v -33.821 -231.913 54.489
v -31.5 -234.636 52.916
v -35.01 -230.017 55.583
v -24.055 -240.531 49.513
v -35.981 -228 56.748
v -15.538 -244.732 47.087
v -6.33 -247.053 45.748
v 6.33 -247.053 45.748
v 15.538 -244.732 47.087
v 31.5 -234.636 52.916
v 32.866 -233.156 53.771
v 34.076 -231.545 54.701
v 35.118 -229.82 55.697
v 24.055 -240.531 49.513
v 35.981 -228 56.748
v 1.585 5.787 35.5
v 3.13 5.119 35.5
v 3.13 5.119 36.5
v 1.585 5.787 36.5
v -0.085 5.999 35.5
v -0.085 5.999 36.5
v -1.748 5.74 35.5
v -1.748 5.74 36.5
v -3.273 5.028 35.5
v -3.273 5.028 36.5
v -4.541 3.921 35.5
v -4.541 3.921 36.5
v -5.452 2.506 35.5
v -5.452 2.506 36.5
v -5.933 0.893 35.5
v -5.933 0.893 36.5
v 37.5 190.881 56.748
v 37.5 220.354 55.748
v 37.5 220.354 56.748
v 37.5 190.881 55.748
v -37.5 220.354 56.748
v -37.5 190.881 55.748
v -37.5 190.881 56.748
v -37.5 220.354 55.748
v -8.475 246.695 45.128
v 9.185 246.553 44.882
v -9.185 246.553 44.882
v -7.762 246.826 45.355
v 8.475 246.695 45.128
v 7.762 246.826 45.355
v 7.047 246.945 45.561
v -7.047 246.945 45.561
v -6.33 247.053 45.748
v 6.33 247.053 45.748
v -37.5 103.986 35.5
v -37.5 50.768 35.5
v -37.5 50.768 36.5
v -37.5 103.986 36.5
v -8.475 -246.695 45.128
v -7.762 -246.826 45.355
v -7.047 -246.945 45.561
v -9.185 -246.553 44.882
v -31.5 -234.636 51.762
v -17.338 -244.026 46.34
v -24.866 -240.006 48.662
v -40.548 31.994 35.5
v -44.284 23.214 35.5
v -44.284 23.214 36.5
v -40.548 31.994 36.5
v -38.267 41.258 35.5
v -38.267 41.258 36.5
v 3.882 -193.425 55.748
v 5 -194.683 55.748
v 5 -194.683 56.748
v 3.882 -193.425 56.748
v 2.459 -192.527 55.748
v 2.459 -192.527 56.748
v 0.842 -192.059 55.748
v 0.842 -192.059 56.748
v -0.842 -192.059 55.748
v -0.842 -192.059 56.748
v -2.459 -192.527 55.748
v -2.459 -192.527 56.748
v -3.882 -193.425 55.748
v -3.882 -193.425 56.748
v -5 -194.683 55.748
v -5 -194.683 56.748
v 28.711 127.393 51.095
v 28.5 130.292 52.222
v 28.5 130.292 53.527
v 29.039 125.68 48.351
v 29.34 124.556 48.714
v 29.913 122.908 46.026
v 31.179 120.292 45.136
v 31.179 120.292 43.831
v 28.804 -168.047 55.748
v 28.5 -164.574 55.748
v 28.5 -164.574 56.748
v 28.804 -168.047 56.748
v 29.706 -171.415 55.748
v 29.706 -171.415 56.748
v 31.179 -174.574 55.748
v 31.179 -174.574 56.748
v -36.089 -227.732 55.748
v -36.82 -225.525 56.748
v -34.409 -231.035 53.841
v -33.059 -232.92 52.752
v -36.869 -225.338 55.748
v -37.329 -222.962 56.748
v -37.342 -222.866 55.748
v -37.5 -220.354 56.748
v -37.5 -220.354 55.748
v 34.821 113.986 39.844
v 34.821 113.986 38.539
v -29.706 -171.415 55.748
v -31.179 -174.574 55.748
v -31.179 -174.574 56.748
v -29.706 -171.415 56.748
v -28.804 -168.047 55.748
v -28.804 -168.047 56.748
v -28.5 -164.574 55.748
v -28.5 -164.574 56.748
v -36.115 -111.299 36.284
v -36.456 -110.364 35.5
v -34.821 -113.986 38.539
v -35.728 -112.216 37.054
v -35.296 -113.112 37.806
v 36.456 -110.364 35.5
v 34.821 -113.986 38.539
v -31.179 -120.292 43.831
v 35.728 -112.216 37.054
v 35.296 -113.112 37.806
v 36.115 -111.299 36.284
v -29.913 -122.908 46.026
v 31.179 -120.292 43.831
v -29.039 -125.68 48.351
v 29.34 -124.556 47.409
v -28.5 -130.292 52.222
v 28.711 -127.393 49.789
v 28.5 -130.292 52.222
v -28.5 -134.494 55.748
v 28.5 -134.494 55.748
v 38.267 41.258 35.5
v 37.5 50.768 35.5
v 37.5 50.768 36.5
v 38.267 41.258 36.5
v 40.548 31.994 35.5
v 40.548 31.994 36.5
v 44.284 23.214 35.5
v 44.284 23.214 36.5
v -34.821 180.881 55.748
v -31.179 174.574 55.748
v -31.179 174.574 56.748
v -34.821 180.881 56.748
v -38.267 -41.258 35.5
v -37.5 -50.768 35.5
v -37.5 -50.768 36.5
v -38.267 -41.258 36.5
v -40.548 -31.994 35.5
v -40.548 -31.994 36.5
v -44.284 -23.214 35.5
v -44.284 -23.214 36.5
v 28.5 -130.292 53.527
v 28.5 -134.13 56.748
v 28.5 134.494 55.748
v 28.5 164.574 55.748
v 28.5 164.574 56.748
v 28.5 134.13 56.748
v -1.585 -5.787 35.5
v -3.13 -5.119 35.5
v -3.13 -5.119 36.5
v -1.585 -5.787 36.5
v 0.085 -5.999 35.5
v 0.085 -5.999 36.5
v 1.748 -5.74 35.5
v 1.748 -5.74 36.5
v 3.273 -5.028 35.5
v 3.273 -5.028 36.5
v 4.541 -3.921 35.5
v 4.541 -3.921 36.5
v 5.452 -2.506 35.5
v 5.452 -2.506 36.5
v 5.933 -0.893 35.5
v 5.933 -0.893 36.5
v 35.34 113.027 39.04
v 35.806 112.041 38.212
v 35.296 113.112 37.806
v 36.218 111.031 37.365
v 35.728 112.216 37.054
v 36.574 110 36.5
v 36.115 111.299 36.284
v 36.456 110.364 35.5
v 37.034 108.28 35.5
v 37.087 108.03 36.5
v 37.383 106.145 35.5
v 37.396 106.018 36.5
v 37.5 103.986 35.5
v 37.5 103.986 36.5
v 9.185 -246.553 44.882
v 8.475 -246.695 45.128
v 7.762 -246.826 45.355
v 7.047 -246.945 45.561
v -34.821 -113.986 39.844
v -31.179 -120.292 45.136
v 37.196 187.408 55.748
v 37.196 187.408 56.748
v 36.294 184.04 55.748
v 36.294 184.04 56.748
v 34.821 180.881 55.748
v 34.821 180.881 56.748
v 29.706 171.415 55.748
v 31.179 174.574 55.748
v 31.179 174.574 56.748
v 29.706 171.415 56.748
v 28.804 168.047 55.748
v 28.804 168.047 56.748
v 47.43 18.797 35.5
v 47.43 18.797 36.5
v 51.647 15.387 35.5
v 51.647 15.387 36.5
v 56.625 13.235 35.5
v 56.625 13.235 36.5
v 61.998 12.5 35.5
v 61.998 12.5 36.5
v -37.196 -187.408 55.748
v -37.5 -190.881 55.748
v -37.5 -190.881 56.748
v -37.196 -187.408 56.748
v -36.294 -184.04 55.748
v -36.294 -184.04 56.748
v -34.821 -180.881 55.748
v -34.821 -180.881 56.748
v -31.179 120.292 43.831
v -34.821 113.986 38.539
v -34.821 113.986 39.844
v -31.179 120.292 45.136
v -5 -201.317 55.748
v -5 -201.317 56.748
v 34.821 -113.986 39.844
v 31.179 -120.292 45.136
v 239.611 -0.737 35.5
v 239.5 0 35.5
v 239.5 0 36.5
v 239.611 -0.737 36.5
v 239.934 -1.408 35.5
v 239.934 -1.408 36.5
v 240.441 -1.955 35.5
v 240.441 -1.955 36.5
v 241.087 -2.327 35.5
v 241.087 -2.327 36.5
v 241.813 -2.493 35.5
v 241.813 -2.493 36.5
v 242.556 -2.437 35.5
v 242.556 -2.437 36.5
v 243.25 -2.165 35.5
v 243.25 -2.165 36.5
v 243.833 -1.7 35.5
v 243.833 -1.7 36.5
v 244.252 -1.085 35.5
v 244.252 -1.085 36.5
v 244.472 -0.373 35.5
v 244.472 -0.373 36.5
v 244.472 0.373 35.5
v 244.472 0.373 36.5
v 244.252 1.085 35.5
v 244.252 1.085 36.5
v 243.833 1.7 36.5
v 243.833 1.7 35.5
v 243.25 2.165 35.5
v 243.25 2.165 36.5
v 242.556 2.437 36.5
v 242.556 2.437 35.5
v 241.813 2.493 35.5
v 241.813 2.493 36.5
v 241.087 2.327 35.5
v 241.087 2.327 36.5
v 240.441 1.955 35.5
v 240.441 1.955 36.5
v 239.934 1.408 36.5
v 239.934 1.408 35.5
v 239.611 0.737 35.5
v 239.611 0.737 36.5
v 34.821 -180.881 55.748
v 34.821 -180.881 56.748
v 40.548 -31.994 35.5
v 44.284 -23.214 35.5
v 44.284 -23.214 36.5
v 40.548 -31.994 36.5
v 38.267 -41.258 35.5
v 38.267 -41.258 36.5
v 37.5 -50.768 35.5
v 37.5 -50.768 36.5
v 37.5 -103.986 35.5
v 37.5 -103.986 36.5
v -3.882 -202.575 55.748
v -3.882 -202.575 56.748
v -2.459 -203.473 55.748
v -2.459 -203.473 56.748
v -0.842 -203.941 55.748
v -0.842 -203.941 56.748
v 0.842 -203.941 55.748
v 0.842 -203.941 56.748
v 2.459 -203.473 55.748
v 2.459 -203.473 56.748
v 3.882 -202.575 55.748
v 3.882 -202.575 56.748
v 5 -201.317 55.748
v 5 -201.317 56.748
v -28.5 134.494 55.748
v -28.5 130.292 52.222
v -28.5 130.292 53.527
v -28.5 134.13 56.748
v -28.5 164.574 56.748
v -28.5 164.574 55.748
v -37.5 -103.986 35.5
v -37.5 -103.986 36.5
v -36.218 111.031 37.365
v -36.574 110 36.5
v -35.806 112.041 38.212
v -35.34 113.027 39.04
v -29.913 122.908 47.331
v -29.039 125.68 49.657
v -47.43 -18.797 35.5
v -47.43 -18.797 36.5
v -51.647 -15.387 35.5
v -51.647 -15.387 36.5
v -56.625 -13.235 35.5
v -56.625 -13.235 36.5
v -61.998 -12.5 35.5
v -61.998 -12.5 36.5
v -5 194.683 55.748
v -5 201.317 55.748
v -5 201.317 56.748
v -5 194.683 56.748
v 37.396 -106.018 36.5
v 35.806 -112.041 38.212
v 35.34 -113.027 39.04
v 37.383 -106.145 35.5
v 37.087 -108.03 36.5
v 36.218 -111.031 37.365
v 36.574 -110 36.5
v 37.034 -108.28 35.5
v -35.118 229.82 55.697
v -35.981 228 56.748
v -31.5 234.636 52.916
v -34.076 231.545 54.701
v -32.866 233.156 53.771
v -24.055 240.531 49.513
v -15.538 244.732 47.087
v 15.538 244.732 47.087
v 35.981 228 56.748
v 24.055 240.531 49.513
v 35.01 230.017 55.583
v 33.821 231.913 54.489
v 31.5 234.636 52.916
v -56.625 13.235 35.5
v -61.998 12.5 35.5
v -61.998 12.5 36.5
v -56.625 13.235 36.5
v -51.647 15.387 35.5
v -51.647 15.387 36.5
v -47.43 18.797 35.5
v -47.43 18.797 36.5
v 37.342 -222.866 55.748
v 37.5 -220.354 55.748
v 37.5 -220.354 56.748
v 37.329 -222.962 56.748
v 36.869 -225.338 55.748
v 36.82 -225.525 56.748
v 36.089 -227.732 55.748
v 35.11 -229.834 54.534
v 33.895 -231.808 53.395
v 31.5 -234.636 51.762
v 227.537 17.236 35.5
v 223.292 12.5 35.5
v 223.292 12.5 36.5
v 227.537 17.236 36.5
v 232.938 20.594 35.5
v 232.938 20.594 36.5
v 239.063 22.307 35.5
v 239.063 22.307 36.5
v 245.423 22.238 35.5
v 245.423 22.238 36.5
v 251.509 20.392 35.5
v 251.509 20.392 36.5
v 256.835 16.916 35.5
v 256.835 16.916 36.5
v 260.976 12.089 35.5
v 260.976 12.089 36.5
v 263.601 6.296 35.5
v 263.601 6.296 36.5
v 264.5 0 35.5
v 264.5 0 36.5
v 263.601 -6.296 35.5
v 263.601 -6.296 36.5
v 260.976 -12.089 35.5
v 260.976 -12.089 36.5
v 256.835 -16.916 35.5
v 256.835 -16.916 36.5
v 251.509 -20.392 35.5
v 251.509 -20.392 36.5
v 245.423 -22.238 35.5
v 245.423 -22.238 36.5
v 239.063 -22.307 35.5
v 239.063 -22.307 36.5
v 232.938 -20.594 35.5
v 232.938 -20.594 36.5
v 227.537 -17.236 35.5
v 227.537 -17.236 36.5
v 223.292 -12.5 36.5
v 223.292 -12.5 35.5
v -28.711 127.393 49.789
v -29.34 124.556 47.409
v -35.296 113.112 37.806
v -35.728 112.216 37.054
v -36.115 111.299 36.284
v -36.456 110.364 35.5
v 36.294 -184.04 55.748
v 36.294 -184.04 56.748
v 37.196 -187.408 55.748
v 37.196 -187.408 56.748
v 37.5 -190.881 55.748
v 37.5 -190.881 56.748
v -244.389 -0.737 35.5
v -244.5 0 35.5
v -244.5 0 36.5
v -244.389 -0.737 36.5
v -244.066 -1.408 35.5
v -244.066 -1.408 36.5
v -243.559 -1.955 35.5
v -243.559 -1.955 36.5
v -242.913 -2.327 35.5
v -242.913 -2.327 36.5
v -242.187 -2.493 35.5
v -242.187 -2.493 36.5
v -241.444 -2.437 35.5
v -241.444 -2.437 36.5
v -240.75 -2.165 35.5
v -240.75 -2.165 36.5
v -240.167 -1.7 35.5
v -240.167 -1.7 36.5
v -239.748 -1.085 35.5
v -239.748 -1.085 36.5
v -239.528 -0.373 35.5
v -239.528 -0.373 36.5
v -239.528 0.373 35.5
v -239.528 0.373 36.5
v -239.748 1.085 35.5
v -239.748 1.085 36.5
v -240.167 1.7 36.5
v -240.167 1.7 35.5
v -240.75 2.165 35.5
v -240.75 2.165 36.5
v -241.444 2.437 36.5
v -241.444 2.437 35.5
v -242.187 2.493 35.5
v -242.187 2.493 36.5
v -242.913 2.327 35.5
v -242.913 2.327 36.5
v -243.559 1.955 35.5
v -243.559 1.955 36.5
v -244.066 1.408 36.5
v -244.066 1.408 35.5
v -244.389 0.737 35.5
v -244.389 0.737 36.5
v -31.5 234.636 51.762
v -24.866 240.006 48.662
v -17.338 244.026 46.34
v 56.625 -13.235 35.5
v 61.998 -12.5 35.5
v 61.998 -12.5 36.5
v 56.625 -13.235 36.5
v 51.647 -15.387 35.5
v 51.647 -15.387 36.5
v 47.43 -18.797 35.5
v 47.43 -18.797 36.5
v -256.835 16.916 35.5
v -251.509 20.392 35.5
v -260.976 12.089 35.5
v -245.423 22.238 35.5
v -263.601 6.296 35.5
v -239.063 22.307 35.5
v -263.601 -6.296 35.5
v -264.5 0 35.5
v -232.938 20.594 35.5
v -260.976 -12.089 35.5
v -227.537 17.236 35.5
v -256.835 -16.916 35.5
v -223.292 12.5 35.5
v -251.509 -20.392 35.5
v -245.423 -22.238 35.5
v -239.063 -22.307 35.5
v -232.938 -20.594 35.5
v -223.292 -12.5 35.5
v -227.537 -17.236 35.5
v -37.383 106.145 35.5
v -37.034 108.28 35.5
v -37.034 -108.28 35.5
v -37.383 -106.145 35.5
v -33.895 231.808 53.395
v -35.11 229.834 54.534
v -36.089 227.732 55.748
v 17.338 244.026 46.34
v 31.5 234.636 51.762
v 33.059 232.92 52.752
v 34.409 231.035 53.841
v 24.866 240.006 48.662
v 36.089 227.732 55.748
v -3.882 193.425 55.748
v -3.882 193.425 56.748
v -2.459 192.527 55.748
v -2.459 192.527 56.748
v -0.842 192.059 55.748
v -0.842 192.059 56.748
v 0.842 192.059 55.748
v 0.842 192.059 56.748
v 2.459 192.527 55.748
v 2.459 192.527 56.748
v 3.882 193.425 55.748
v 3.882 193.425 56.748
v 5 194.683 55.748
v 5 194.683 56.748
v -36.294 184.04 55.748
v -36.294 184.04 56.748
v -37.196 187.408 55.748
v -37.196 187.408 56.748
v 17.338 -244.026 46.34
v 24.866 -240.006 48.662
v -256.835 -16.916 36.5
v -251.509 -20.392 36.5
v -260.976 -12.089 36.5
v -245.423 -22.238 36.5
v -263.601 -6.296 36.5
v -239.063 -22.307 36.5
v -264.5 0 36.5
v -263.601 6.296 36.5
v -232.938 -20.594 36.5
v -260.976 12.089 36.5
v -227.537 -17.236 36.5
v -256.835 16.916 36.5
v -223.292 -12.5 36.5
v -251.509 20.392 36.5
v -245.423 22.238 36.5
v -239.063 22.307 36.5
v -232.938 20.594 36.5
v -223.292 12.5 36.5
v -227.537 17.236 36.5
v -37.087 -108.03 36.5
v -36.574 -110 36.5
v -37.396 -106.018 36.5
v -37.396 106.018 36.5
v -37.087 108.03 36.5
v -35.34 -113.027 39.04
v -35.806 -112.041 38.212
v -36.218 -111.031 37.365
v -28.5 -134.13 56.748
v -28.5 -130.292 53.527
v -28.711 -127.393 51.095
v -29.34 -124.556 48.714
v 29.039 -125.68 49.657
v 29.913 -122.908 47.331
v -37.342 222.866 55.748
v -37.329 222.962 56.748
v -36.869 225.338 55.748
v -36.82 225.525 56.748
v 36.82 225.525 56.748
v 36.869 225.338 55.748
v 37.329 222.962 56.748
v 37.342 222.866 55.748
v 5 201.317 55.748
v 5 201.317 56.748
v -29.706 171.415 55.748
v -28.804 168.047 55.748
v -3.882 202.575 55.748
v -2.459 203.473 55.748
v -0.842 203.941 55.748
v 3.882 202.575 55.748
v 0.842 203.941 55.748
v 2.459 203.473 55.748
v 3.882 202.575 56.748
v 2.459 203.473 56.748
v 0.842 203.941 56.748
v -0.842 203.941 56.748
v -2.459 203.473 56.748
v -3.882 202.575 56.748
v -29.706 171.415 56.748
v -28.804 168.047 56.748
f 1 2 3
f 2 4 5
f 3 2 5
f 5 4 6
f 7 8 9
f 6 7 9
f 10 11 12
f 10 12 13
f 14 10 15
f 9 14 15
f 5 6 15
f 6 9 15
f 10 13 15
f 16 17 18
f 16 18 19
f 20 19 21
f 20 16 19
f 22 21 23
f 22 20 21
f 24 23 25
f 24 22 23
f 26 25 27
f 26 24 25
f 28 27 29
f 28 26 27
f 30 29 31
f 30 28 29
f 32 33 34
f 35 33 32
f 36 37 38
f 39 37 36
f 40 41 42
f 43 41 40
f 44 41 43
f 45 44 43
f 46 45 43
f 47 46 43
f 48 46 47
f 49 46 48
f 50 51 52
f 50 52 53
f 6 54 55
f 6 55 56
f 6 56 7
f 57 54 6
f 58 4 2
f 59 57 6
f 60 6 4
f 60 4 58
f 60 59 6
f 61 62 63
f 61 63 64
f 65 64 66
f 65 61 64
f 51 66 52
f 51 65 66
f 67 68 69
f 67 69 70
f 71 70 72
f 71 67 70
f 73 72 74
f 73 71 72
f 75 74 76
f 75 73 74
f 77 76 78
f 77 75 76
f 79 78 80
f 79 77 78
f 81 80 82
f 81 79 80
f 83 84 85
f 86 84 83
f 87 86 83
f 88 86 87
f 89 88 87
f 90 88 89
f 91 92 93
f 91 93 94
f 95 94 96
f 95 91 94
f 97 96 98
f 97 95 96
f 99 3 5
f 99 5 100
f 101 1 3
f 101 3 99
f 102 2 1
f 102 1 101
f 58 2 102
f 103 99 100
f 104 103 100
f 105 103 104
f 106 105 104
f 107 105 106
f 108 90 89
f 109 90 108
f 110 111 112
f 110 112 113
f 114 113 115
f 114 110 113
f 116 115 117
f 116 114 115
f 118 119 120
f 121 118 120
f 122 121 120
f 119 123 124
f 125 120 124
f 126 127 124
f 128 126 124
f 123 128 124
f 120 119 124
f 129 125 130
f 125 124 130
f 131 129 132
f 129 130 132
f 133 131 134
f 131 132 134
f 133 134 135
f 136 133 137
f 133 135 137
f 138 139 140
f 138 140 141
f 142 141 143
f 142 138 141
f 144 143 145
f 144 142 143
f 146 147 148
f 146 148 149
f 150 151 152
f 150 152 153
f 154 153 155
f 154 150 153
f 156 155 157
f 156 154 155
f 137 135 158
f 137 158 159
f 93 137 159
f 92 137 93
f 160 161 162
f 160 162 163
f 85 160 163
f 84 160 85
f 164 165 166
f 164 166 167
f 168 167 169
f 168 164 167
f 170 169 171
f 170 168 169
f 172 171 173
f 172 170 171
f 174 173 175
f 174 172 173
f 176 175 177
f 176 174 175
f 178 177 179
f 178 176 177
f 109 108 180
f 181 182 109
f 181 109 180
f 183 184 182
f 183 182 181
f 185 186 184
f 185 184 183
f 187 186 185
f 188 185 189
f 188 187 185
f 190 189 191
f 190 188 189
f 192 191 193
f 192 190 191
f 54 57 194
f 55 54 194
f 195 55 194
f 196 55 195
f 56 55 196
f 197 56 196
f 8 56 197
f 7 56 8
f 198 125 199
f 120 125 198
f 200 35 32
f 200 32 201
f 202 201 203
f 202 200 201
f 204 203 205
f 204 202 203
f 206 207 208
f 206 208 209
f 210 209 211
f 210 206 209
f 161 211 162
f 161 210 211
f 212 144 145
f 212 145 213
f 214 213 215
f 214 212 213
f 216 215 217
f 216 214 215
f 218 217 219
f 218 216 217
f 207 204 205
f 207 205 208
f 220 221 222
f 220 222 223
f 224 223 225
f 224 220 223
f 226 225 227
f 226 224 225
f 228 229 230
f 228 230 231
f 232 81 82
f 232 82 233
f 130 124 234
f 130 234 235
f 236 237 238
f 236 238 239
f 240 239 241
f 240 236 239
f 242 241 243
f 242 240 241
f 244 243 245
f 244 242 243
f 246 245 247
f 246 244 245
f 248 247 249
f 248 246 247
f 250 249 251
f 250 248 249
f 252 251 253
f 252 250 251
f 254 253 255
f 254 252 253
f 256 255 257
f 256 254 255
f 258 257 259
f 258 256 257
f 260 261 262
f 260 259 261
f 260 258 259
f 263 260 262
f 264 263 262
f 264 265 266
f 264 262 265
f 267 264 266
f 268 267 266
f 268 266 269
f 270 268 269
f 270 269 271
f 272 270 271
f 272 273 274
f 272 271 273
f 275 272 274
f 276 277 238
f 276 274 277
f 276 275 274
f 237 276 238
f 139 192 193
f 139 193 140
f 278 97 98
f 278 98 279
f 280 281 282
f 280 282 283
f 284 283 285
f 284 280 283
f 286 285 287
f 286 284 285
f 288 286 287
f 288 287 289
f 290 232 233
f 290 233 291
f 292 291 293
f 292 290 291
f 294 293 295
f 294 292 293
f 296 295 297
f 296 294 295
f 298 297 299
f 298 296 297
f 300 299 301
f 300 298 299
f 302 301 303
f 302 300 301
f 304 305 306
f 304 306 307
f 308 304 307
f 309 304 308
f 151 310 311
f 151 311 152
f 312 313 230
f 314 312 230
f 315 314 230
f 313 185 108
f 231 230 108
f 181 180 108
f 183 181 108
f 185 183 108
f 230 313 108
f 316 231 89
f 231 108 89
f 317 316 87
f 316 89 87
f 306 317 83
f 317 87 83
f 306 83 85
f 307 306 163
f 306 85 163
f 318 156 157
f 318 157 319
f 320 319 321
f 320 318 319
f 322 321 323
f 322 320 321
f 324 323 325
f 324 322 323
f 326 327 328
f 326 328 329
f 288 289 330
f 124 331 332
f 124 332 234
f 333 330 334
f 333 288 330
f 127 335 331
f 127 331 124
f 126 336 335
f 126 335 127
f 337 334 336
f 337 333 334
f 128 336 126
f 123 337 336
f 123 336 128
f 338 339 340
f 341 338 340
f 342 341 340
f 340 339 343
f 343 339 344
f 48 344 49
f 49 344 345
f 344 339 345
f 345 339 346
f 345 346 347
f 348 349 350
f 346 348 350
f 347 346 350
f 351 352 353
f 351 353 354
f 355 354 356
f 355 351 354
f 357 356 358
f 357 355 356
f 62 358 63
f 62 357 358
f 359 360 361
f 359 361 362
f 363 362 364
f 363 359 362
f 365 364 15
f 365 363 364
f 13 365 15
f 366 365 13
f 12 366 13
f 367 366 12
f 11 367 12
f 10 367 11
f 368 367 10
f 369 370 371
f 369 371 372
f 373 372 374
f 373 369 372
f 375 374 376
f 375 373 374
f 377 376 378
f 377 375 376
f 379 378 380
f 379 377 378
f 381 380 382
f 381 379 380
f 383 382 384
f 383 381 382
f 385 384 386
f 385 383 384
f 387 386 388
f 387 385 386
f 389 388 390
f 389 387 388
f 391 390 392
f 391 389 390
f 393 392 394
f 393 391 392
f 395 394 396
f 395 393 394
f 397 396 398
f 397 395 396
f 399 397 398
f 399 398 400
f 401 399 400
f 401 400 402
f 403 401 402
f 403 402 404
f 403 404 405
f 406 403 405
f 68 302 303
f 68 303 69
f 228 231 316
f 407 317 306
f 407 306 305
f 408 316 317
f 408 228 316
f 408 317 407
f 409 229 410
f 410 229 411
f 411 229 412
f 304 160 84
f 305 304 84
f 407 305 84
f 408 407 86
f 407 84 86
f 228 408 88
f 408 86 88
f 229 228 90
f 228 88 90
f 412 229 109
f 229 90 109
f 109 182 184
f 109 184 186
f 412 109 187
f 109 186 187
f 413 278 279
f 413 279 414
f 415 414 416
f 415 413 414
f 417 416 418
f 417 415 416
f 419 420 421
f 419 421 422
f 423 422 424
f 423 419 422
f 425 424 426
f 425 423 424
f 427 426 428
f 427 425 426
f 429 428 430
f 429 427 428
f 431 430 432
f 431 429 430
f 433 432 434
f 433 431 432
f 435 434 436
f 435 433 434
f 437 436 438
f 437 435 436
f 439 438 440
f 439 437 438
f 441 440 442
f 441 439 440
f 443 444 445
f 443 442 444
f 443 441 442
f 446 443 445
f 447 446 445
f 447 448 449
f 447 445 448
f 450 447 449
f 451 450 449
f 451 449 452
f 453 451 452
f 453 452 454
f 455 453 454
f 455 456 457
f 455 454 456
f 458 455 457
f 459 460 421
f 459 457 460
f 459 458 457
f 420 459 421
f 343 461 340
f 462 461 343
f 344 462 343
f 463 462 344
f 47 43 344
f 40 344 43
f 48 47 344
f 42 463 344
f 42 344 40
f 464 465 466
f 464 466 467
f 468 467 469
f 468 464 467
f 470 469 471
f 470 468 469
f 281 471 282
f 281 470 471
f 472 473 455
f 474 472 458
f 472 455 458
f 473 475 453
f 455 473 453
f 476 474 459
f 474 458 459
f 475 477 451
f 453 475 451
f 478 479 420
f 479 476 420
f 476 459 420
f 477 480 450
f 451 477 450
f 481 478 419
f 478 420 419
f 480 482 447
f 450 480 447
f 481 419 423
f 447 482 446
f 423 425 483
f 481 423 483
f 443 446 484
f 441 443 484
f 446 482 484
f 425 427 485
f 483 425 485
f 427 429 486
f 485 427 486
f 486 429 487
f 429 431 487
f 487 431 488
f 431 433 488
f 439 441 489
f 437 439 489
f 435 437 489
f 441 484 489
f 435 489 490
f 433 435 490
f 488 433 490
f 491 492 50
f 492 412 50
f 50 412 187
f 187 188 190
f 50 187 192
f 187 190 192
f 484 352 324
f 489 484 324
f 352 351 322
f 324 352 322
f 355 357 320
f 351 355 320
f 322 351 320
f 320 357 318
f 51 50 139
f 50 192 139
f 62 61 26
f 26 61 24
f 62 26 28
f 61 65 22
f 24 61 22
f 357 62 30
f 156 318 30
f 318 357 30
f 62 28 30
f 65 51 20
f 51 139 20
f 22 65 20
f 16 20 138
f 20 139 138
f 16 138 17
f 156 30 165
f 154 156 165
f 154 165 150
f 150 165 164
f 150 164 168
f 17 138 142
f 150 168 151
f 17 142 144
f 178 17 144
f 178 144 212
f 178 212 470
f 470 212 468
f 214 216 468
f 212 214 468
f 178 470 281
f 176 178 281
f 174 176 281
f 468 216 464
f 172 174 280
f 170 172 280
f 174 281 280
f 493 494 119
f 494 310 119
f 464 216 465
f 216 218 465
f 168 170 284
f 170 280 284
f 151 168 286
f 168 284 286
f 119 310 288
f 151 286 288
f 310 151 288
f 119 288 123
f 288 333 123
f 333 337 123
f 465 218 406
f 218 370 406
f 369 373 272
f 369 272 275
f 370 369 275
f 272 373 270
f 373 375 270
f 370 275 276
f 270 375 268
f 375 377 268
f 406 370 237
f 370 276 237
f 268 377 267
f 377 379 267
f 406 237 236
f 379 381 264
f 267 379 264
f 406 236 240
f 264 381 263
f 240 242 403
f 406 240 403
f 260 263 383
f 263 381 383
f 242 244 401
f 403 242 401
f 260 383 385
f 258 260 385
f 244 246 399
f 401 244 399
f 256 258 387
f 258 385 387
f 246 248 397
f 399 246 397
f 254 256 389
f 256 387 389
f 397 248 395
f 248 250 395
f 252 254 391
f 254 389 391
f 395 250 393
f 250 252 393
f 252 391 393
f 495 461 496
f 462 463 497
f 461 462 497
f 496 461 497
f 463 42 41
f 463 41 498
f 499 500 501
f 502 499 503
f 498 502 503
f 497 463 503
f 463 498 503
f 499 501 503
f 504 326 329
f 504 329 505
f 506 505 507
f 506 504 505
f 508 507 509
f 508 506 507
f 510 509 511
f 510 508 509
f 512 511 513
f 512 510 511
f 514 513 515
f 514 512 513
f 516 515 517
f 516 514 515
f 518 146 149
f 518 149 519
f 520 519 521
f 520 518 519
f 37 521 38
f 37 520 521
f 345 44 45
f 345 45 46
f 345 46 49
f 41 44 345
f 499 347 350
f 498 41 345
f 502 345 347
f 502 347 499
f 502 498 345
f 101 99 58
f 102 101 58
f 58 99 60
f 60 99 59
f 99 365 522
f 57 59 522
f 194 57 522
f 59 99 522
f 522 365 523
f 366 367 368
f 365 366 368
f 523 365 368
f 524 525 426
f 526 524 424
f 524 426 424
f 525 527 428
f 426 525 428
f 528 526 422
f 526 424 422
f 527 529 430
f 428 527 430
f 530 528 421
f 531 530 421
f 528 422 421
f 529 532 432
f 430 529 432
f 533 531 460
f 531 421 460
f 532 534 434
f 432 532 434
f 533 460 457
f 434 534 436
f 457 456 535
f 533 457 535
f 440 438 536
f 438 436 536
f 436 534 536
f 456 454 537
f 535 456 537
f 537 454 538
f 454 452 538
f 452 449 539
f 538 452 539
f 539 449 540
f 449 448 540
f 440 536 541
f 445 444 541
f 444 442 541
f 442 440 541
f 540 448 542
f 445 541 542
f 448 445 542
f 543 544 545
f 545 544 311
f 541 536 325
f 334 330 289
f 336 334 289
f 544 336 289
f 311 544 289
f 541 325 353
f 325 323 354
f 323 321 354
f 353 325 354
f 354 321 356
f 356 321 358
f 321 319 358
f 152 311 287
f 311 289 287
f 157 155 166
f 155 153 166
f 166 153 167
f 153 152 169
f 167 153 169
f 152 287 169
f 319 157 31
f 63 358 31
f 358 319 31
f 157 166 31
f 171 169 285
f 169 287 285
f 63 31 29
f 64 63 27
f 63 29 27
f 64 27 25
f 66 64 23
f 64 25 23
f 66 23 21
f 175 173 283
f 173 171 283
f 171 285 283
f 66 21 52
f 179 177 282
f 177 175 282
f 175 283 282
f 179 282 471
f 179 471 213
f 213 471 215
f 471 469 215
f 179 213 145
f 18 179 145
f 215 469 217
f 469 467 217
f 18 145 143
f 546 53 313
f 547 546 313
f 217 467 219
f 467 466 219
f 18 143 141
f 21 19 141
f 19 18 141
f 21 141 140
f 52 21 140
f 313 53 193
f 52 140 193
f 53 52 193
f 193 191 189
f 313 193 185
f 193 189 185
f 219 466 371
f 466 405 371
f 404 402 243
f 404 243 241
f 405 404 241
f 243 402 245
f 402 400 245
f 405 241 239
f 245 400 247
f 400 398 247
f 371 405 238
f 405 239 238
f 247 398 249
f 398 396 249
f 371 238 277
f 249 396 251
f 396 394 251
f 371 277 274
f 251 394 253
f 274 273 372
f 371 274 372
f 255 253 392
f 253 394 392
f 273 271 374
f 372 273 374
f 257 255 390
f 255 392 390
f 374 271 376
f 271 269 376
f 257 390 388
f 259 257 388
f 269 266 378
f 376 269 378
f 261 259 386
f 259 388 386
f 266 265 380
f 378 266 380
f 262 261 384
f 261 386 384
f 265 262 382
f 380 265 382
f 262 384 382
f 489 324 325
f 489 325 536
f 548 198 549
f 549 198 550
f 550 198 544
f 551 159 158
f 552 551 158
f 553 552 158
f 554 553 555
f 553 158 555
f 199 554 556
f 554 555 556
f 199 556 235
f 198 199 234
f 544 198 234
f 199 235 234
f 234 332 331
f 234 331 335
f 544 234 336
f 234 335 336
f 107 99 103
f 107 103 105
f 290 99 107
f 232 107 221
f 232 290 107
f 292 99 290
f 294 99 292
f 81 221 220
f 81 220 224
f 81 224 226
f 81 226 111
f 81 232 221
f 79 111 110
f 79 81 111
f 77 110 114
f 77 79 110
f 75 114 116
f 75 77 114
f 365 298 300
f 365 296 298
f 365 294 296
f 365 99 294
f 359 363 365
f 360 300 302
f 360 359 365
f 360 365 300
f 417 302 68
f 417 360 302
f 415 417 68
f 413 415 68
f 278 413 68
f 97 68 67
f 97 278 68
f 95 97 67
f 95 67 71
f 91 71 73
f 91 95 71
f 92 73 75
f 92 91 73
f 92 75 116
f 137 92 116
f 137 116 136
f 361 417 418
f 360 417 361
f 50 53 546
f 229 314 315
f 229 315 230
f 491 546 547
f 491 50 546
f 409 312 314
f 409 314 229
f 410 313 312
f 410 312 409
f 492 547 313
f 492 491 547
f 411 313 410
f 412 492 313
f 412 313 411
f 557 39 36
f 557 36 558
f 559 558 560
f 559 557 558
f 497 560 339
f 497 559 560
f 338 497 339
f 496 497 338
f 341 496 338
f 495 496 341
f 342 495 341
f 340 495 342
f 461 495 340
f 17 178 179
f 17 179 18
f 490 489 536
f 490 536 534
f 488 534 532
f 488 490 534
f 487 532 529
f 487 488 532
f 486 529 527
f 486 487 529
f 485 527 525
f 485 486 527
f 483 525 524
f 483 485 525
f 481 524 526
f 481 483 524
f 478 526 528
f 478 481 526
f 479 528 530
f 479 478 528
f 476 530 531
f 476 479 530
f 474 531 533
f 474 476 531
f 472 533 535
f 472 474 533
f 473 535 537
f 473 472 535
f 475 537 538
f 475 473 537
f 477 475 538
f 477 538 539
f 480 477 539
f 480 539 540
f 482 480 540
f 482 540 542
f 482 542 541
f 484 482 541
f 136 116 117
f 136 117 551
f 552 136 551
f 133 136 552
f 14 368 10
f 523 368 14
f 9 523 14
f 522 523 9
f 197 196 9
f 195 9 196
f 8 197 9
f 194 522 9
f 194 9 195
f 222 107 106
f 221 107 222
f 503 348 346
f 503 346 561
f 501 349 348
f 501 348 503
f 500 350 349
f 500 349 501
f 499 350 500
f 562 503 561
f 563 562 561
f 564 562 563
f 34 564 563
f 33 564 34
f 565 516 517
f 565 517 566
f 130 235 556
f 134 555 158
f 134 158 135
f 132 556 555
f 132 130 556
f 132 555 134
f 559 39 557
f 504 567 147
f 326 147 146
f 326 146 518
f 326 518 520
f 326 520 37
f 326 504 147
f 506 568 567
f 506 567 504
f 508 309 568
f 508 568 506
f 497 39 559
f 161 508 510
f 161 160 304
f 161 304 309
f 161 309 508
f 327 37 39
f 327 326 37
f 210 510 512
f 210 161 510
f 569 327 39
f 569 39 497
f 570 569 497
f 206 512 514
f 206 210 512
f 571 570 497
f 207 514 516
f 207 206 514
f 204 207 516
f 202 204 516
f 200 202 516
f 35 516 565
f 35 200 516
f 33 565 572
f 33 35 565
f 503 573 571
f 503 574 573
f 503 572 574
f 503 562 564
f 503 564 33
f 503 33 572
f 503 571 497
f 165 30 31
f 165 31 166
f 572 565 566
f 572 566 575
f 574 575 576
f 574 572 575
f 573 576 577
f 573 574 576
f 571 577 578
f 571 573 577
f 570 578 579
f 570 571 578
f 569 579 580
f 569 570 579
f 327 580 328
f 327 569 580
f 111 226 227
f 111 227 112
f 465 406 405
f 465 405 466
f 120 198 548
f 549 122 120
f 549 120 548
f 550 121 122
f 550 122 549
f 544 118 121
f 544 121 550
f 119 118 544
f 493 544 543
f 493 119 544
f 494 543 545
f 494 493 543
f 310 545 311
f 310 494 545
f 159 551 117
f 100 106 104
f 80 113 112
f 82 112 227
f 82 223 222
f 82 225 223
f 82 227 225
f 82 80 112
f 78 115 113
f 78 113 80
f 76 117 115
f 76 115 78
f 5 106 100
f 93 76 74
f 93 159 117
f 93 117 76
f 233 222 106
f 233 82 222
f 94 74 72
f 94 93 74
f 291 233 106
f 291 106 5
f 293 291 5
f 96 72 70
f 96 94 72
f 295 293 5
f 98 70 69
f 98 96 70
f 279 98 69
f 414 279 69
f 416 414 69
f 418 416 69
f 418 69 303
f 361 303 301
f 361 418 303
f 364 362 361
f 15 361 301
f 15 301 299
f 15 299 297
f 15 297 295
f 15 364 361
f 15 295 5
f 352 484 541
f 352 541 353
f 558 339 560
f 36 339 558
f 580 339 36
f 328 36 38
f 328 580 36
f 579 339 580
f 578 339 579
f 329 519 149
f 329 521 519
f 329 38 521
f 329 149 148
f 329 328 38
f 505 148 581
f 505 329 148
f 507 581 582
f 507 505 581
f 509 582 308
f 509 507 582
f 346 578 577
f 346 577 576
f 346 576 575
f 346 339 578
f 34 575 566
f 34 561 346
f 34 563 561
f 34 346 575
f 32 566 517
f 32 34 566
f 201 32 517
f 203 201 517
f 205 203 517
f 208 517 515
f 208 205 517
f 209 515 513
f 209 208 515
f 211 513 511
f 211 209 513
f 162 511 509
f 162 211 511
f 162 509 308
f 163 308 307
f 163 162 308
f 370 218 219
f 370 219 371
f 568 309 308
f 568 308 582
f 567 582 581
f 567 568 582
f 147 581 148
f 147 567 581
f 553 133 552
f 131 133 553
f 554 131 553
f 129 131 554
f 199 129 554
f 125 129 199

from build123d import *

# Parameters (mm, degrees)
SALIENTE_EXTRUIR1_DEPTH     = 271
CORTAR_EXTRUIR9_DEPTH       = 372.074494889
CORTAR_EXTRUIR9_DEPTH_BACK  = 372.074494889
CROQUIS4_R                  = 2.5
CORTAR_EXTRUIR11_DEPTH      = 372.074494889
CORTAR_EXTRUIR11_DEPTH_BACK = 372.074494889
CROQUIS2_W                  = 600.899293422
CROQUIS2_H                  = 554.061756016


with BuildPart() as part:
    # Croquis1 → Saliente-Extruir1 (new, symmetric)
    with BuildSketch(Plane(origin=(0, 0, 0), x_dir=(0, 0, -1), z_dir=(1, 0, 0))):
        Polygon((-36.5, -110), (-36.5, 110), (-56.747809705, 134.130399958), (-56.747809705, 198), (-56.747809705, 228), (-45.747809705, 247.052558883), (-44.881784301, 246.552558883), (-55.747809705, 227.732050808), (-55.747809705, 198), (-55.747809705, 134.494370193), (-35.5, 110.363970234), (-35.5, -110.363970234), (-55.747809705, -134.494370193), (-55.747809705, -198), (-55.747809705, -227.732050808), (-44.881784301, -246.552558883), (-45.747809705, -247.052558883), (-56.747809705, -228), (-56.747809705, -198), (-56.747809705, -134.130399958), align=None)
    extrude(amount=SALIENTE_EXTRUIR1_DEPTH, both=True)

    # Croquis4 → Cortar-Extruir9 (cut, two sides: drawn at the far end of the back side and taken through both)
    with BuildSketch(Plane.XY.offset(-CORTAR_EXTRUIR9_DEPTH_BACK)):
        with Locations(Location((-242, 0, 0), (0, 0, 180))):
            Circle(CROQUIS4_R)
        with Locations(Location((242, 0, 0), (0, 0, 180))):
            Circle(CROQUIS4_R)
        with BuildLine():
            Line((-5, 201.31662479), (-5, 194.68337521))
            ThreePointArc((-5, 194.68337521), (0, 192), (5, 194.68337521))
            Line((5, 194.68337521), (5, 201.31662479))
            ThreePointArc((5, 201.31662479), (0, 204), (-5, 201.31662479))
        make_face()
        with BuildLine():
            Line((5, -201.31662479), (5, -194.68337521))
            ThreePointArc((5, -194.68337521), (0, -192), (-5, -194.68337521))
            Line((-5, -194.68337521), (-5, -201.31662479))
            ThreePointArc((-5, -201.31662479), (0, -204), (5, -201.31662479))
        make_face()
        with BuildLine():
            Line((-5.933205139, 0.892791565), (-3.129872731, -5.118974183))
            ThreePointArc((-3.129872731, -5.118974183), (2.53570957, -5.437846722), (5.933205139, -0.892791565))
            Line((5.933205139, -0.892791565), (3.129872731, 5.118974183))
            ThreePointArc((3.129872731, 5.118974183), (-2.53570957, 5.437846722), (-5.933205139, 0.892791565))
        make_face()
    extrude(amount=CORTAR_EXTRUIR9_DEPTH + CORTAR_EXTRUIR9_DEPTH_BACK, mode=Mode.SUBTRACT)

    # Croquis2 → Cortar-Extruir11 (cut, two sides: drawn at the far end of the back side and taken through both)
    with BuildSketch(Plane.XY.offset(-CORTAR_EXTRUIR11_DEPTH_BACK)):
        Rectangle(CROQUIS2_W, CROQUIS2_H)
        with BuildLine():
            Line((-31.179491924, 174.57413175), (-34.820508076, 180.880556715))
            ThreePointArc((-34.820508076, 180.880556715), (-36.818516526, 185.704175813), (-37.5, 190.880556715))
            Line((-37.5, 190.880556715), (-37.5, 220.353571071))
            ThreePointArc((-37.5, 220.353571071), (-35.939088915, 228.099537764), (-31.5, 234.636427928))
            ThreePointArc((-31.5, 234.636427928), (0, 247.5), (31.5, 234.636427928))
            ThreePointArc((31.5, 234.636427928), (35.939088915, 228.099537764), (37.5, 220.353571071))
            Line((37.5, 220.353571071), (37.5, 190.880556715))
            ThreePointArc((37.5, 190.880556715), (36.818516526, 185.704175813), (34.820508076, 180.880556715))
            Line((34.820508076, 180.880556715), (31.179491924, 174.57413175))
            ThreePointArc((31.179491924, 174.57413175), (29.181483474, 169.750512652), (28.5, 164.57413175))
            Line((28.5, 164.57413175), (28.5, 130.292099447))
            ThreePointArc((28.5, 130.292099447), (29.181483474, 125.115718545), (31.179491924, 120.292099447))
            Line((31.179491924, 120.292099447), (34.820508076, 113.985674482))
            ThreePointArc((34.820508076, 113.985674482), (36.818516526, 109.162055384), (37.5, 103.985674482))
            Line((37.5, 103.985674482), (37.5, 50.768455322))
            ThreePointArc((37.5, 50.768455322), (39.221022598, 36.579915591), (44.28427417, 23.214285714))
            ThreePointArc((44.28427417, 23.214285714), (51.647000448, 15.386930642), (61.997983838, 12.5))
            Line((61.997983838, 12.5), (223.291713066, 12.5))
            ThreePointArc((223.291713066, 12.5), (264.5, 0), (223.291713066, -12.5))
            Line((223.291713066, -12.5), (61.997983838, -12.5))
            ThreePointArc((61.997983838, -12.5), (51.647000448, -15.386930642), (44.28427417, -23.214285714))
            ThreePointArc((44.28427417, -23.214285714), (39.221022598, -36.579915591), (37.5, -50.768455322))
            Line((37.5, -50.768455322), (37.5, -103.985674482))
            ThreePointArc((37.5, -103.985674482), (36.818516526, -109.162055384), (34.820508076, -113.985674482))
            Line((34.820508076, -113.985674482), (31.179491924, -120.292099447))
            ThreePointArc((31.179491924, -120.292099447), (29.181483474, -125.115718545), (28.5, -130.292099447))
            Line((28.5, -130.292099447), (28.5, -164.57413175))
            ThreePointArc((28.5, -164.57413175), (29.181483474, -169.750512652), (31.179491924, -174.57413175))
            Line((31.179491924, -174.57413175), (34.820508076, -180.880556715))
            ThreePointArc((34.820508076, -180.880556715), (36.818516526, -185.704175813), (37.5, -190.880556715))
            Line((37.5, -190.880556715), (37.5, -220.353571071))
            ThreePointArc((37.5, -220.353571071), (35.939088915, -228.099537764), (31.5, -234.636427928))
            ThreePointArc((31.5, -234.636427928), (0, -247.5), (-31.5, -234.636427928))
            ThreePointArc((-31.5, -234.636427928), (-35.939088915, -228.099537764), (-37.5, -220.353571071))
            Line((-37.5, -220.353571071), (-37.5, -190.880556715))
            ThreePointArc((-37.5, -190.880556715), (-36.818516526, -185.704175813), (-34.820508076, -180.880556715))
            Line((-34.820508076, -180.880556715), (-31.179491924, -174.57413175))
            ThreePointArc((-31.179491924, -174.57413175), (-29.181483474, -169.750512652), (-28.5, -164.57413175))
            Line((-28.5, -164.57413175), (-28.5, -130.292099447))
            ThreePointArc((-28.5, -130.292099447), (-29.181483474, -125.115718545), (-31.179491924, -120.292099447))
            Line((-31.179491924, -120.292099447), (-34.820508076, -113.985674482))
            ThreePointArc((-34.820508076, -113.985674482), (-36.818516526, -109.162055384), (-37.5, -103.985674482))
            Line((-37.5, -103.985674482), (-37.5, -50.768455322))
            ThreePointArc((-37.5, -50.768455322), (-39.221022598, -36.579915591), (-44.28427417, -23.214285714))
            ThreePointArc((-44.28427417, -23.214285714), (-51.647000448, -15.386930642), (-61.997983838, -12.5))
            Line((-61.997983838, -12.5), (-223.291713066, -12.5))
            ThreePointArc((-223.291713066, -12.5), (-264.5, 0), (-223.291713066, 12.5))
            Line((-223.291713066, 12.5), (-61.997983838, 12.5))
            ThreePointArc((-61.997983838, 12.5), (-51.647000448, 15.386930642), (-44.28427417, 23.214285714))
            ThreePointArc((-44.28427417, 23.214285714), (-39.221022598, 36.579915591), (-37.5, 50.768455322))
            Line((-37.5, 50.768455322), (-37.5, 103.985674482))
            ThreePointArc((-37.5, 103.985674482), (-36.818516526, 109.162055384), (-34.820508076, 113.985674482))
            Line((-34.820508076, 113.985674482), (-31.179491924, 120.292099447))
            ThreePointArc((-31.179491924, 120.292099447), (-29.181483474, 125.115718545), (-28.5, 130.292099447))
            Line((-28.5, 130.292099447), (-28.5, 164.57413175))
            ThreePointArc((-28.5, 164.57413175), (-29.181483474, 169.750512652), (-31.179491924, 174.57413175))
        make_face(mode=Mode.SUBTRACT)
    extrude(amount=CORTAR_EXTRUIR11_DEPTH + CORTAR_EXTRUIR11_DEPTH_BACK, mode=Mode.SUBTRACT)


solid = part.part
